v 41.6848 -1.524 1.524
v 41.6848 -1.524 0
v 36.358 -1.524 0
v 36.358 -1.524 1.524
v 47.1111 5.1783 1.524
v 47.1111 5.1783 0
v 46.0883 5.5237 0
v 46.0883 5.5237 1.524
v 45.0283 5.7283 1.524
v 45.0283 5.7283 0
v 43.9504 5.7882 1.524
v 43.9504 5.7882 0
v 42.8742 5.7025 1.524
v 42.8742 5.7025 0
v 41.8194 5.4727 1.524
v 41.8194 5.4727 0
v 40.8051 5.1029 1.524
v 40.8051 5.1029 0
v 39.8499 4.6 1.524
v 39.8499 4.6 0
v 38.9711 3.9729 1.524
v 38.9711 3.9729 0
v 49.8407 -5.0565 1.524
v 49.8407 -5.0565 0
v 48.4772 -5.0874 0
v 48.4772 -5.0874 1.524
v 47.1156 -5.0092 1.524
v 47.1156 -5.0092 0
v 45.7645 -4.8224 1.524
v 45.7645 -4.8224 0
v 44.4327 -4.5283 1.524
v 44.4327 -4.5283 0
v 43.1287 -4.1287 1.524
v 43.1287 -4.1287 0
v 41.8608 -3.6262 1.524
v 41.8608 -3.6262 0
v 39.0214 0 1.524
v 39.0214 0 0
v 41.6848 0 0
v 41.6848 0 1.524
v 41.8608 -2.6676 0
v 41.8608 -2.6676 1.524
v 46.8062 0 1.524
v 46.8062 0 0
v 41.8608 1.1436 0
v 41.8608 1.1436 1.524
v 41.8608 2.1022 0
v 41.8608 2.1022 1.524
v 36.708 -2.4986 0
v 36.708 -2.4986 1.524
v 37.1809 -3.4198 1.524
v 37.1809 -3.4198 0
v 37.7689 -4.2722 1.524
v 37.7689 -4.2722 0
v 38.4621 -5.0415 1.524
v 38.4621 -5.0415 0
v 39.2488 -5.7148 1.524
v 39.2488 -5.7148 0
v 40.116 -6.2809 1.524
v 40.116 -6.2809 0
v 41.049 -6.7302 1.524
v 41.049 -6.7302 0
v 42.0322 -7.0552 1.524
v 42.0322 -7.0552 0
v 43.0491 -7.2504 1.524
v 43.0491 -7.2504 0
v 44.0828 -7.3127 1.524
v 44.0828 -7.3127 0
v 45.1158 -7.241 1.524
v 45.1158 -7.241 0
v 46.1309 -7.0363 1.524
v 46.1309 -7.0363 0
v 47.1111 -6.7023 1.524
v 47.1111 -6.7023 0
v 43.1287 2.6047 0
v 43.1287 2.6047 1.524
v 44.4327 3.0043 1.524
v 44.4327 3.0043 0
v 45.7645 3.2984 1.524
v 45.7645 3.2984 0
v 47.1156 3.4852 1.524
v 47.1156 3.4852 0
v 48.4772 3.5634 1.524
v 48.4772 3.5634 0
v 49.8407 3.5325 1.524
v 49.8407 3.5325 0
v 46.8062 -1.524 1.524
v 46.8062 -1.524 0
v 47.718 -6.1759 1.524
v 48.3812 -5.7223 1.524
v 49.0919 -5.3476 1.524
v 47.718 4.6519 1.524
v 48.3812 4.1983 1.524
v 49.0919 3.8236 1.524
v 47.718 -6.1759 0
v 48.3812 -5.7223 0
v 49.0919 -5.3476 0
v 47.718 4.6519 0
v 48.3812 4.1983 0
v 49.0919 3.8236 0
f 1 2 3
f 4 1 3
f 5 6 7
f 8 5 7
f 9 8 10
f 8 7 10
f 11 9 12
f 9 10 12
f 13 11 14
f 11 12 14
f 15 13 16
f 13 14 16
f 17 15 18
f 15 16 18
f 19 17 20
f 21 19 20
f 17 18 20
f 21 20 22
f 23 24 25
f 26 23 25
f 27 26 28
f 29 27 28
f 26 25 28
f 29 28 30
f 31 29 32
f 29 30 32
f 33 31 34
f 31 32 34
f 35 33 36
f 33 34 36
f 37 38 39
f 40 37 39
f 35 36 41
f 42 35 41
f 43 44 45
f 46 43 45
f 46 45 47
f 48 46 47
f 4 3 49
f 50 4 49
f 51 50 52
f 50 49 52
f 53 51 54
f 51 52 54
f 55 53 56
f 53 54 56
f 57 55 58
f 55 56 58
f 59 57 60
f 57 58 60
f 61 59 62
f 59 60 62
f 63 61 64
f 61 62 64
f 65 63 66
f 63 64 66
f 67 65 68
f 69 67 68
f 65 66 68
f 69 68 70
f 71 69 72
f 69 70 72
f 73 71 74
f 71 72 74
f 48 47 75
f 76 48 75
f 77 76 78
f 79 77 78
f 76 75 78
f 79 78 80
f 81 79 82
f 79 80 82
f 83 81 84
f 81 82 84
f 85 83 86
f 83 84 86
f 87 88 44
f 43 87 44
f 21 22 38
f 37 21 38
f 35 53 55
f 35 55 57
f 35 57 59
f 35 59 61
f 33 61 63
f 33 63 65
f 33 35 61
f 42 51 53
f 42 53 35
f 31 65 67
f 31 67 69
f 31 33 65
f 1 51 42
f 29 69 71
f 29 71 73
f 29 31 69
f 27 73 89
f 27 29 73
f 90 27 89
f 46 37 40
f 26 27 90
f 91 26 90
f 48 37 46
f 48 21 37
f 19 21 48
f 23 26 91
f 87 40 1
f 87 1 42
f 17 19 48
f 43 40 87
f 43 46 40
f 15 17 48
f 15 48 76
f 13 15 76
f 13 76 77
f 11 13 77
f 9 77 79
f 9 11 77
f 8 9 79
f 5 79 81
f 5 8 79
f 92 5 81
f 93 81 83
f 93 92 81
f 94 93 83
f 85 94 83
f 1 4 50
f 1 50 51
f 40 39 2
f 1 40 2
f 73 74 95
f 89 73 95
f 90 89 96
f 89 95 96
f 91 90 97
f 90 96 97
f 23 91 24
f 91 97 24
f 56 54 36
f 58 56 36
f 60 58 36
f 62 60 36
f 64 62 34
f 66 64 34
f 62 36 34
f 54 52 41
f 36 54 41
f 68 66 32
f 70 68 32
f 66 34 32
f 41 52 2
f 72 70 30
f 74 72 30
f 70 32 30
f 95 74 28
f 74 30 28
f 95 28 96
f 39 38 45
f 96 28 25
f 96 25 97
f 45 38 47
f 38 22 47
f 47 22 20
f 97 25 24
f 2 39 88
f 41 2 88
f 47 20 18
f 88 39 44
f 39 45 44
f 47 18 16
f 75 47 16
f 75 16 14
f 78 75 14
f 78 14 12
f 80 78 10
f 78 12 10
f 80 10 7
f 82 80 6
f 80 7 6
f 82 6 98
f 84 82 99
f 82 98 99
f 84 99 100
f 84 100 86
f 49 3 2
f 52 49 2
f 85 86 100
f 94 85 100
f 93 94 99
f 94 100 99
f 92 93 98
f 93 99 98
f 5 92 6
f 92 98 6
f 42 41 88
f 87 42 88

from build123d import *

# Parameters (mm, degrees)
BOSS_EXTRUDE1_DEPTH = 1.524


with BuildPart() as part:
    # Sketch1 → Boss-Extrude1 (new body)
    with BuildSketch(Plane.XY):
        with BuildLine():
            Line((41.68481024, 0), (41.68481024, -1.524))
            Line((41.68481024, -1.524), (36.357969238, -1.524))
            ThreePointArc((36.357969238, -1.524), (40.575187599, -6.520629639), (47.11110588, -6.702318062))
            ThreePointArc((47.11110588, -6.702318062), (48.381195539, -5.722313338), (49.840736605, -5.056522921))
            ThreePointArc((49.840736605, -5.056522921), (45.764525456, -4.822424484), (41.860759392, -3.626218014))
            Line((41.860759392, -3.626218014), (41.860759392, -2.667580322))
            Line((41.860759392, -2.667580322), (46.80618972, -1.524))
            Line((46.80618972, -1.524), (46.80618972, 0))
            Line((46.80618972, 0), (41.860759392, 1.143580322))
            Line((41.860759392, 1.143580322), (41.860759392, 2.102218014))
            ThreePointArc((41.860759392, 2.102218014), (45.764525456, 3.298424484), (49.840736605, 3.532522921))
            ThreePointArc((49.840736605, 3.532522921), (48.381195539, 4.198313338), (47.11110588, 5.178318062))
            ThreePointArc((47.11110588, 5.178318062), (42.874226953, 5.702520491), (38.97108533, 3.972949241))
            Line((38.97108533, 3.972949241), (39.021389739, 0))
            Line((39.021389739, 0), (41.68481024, 0))
        make_face()
    extrude(amount=BOSS_EXTRUDE1_DEPTH)


solid = part.part
